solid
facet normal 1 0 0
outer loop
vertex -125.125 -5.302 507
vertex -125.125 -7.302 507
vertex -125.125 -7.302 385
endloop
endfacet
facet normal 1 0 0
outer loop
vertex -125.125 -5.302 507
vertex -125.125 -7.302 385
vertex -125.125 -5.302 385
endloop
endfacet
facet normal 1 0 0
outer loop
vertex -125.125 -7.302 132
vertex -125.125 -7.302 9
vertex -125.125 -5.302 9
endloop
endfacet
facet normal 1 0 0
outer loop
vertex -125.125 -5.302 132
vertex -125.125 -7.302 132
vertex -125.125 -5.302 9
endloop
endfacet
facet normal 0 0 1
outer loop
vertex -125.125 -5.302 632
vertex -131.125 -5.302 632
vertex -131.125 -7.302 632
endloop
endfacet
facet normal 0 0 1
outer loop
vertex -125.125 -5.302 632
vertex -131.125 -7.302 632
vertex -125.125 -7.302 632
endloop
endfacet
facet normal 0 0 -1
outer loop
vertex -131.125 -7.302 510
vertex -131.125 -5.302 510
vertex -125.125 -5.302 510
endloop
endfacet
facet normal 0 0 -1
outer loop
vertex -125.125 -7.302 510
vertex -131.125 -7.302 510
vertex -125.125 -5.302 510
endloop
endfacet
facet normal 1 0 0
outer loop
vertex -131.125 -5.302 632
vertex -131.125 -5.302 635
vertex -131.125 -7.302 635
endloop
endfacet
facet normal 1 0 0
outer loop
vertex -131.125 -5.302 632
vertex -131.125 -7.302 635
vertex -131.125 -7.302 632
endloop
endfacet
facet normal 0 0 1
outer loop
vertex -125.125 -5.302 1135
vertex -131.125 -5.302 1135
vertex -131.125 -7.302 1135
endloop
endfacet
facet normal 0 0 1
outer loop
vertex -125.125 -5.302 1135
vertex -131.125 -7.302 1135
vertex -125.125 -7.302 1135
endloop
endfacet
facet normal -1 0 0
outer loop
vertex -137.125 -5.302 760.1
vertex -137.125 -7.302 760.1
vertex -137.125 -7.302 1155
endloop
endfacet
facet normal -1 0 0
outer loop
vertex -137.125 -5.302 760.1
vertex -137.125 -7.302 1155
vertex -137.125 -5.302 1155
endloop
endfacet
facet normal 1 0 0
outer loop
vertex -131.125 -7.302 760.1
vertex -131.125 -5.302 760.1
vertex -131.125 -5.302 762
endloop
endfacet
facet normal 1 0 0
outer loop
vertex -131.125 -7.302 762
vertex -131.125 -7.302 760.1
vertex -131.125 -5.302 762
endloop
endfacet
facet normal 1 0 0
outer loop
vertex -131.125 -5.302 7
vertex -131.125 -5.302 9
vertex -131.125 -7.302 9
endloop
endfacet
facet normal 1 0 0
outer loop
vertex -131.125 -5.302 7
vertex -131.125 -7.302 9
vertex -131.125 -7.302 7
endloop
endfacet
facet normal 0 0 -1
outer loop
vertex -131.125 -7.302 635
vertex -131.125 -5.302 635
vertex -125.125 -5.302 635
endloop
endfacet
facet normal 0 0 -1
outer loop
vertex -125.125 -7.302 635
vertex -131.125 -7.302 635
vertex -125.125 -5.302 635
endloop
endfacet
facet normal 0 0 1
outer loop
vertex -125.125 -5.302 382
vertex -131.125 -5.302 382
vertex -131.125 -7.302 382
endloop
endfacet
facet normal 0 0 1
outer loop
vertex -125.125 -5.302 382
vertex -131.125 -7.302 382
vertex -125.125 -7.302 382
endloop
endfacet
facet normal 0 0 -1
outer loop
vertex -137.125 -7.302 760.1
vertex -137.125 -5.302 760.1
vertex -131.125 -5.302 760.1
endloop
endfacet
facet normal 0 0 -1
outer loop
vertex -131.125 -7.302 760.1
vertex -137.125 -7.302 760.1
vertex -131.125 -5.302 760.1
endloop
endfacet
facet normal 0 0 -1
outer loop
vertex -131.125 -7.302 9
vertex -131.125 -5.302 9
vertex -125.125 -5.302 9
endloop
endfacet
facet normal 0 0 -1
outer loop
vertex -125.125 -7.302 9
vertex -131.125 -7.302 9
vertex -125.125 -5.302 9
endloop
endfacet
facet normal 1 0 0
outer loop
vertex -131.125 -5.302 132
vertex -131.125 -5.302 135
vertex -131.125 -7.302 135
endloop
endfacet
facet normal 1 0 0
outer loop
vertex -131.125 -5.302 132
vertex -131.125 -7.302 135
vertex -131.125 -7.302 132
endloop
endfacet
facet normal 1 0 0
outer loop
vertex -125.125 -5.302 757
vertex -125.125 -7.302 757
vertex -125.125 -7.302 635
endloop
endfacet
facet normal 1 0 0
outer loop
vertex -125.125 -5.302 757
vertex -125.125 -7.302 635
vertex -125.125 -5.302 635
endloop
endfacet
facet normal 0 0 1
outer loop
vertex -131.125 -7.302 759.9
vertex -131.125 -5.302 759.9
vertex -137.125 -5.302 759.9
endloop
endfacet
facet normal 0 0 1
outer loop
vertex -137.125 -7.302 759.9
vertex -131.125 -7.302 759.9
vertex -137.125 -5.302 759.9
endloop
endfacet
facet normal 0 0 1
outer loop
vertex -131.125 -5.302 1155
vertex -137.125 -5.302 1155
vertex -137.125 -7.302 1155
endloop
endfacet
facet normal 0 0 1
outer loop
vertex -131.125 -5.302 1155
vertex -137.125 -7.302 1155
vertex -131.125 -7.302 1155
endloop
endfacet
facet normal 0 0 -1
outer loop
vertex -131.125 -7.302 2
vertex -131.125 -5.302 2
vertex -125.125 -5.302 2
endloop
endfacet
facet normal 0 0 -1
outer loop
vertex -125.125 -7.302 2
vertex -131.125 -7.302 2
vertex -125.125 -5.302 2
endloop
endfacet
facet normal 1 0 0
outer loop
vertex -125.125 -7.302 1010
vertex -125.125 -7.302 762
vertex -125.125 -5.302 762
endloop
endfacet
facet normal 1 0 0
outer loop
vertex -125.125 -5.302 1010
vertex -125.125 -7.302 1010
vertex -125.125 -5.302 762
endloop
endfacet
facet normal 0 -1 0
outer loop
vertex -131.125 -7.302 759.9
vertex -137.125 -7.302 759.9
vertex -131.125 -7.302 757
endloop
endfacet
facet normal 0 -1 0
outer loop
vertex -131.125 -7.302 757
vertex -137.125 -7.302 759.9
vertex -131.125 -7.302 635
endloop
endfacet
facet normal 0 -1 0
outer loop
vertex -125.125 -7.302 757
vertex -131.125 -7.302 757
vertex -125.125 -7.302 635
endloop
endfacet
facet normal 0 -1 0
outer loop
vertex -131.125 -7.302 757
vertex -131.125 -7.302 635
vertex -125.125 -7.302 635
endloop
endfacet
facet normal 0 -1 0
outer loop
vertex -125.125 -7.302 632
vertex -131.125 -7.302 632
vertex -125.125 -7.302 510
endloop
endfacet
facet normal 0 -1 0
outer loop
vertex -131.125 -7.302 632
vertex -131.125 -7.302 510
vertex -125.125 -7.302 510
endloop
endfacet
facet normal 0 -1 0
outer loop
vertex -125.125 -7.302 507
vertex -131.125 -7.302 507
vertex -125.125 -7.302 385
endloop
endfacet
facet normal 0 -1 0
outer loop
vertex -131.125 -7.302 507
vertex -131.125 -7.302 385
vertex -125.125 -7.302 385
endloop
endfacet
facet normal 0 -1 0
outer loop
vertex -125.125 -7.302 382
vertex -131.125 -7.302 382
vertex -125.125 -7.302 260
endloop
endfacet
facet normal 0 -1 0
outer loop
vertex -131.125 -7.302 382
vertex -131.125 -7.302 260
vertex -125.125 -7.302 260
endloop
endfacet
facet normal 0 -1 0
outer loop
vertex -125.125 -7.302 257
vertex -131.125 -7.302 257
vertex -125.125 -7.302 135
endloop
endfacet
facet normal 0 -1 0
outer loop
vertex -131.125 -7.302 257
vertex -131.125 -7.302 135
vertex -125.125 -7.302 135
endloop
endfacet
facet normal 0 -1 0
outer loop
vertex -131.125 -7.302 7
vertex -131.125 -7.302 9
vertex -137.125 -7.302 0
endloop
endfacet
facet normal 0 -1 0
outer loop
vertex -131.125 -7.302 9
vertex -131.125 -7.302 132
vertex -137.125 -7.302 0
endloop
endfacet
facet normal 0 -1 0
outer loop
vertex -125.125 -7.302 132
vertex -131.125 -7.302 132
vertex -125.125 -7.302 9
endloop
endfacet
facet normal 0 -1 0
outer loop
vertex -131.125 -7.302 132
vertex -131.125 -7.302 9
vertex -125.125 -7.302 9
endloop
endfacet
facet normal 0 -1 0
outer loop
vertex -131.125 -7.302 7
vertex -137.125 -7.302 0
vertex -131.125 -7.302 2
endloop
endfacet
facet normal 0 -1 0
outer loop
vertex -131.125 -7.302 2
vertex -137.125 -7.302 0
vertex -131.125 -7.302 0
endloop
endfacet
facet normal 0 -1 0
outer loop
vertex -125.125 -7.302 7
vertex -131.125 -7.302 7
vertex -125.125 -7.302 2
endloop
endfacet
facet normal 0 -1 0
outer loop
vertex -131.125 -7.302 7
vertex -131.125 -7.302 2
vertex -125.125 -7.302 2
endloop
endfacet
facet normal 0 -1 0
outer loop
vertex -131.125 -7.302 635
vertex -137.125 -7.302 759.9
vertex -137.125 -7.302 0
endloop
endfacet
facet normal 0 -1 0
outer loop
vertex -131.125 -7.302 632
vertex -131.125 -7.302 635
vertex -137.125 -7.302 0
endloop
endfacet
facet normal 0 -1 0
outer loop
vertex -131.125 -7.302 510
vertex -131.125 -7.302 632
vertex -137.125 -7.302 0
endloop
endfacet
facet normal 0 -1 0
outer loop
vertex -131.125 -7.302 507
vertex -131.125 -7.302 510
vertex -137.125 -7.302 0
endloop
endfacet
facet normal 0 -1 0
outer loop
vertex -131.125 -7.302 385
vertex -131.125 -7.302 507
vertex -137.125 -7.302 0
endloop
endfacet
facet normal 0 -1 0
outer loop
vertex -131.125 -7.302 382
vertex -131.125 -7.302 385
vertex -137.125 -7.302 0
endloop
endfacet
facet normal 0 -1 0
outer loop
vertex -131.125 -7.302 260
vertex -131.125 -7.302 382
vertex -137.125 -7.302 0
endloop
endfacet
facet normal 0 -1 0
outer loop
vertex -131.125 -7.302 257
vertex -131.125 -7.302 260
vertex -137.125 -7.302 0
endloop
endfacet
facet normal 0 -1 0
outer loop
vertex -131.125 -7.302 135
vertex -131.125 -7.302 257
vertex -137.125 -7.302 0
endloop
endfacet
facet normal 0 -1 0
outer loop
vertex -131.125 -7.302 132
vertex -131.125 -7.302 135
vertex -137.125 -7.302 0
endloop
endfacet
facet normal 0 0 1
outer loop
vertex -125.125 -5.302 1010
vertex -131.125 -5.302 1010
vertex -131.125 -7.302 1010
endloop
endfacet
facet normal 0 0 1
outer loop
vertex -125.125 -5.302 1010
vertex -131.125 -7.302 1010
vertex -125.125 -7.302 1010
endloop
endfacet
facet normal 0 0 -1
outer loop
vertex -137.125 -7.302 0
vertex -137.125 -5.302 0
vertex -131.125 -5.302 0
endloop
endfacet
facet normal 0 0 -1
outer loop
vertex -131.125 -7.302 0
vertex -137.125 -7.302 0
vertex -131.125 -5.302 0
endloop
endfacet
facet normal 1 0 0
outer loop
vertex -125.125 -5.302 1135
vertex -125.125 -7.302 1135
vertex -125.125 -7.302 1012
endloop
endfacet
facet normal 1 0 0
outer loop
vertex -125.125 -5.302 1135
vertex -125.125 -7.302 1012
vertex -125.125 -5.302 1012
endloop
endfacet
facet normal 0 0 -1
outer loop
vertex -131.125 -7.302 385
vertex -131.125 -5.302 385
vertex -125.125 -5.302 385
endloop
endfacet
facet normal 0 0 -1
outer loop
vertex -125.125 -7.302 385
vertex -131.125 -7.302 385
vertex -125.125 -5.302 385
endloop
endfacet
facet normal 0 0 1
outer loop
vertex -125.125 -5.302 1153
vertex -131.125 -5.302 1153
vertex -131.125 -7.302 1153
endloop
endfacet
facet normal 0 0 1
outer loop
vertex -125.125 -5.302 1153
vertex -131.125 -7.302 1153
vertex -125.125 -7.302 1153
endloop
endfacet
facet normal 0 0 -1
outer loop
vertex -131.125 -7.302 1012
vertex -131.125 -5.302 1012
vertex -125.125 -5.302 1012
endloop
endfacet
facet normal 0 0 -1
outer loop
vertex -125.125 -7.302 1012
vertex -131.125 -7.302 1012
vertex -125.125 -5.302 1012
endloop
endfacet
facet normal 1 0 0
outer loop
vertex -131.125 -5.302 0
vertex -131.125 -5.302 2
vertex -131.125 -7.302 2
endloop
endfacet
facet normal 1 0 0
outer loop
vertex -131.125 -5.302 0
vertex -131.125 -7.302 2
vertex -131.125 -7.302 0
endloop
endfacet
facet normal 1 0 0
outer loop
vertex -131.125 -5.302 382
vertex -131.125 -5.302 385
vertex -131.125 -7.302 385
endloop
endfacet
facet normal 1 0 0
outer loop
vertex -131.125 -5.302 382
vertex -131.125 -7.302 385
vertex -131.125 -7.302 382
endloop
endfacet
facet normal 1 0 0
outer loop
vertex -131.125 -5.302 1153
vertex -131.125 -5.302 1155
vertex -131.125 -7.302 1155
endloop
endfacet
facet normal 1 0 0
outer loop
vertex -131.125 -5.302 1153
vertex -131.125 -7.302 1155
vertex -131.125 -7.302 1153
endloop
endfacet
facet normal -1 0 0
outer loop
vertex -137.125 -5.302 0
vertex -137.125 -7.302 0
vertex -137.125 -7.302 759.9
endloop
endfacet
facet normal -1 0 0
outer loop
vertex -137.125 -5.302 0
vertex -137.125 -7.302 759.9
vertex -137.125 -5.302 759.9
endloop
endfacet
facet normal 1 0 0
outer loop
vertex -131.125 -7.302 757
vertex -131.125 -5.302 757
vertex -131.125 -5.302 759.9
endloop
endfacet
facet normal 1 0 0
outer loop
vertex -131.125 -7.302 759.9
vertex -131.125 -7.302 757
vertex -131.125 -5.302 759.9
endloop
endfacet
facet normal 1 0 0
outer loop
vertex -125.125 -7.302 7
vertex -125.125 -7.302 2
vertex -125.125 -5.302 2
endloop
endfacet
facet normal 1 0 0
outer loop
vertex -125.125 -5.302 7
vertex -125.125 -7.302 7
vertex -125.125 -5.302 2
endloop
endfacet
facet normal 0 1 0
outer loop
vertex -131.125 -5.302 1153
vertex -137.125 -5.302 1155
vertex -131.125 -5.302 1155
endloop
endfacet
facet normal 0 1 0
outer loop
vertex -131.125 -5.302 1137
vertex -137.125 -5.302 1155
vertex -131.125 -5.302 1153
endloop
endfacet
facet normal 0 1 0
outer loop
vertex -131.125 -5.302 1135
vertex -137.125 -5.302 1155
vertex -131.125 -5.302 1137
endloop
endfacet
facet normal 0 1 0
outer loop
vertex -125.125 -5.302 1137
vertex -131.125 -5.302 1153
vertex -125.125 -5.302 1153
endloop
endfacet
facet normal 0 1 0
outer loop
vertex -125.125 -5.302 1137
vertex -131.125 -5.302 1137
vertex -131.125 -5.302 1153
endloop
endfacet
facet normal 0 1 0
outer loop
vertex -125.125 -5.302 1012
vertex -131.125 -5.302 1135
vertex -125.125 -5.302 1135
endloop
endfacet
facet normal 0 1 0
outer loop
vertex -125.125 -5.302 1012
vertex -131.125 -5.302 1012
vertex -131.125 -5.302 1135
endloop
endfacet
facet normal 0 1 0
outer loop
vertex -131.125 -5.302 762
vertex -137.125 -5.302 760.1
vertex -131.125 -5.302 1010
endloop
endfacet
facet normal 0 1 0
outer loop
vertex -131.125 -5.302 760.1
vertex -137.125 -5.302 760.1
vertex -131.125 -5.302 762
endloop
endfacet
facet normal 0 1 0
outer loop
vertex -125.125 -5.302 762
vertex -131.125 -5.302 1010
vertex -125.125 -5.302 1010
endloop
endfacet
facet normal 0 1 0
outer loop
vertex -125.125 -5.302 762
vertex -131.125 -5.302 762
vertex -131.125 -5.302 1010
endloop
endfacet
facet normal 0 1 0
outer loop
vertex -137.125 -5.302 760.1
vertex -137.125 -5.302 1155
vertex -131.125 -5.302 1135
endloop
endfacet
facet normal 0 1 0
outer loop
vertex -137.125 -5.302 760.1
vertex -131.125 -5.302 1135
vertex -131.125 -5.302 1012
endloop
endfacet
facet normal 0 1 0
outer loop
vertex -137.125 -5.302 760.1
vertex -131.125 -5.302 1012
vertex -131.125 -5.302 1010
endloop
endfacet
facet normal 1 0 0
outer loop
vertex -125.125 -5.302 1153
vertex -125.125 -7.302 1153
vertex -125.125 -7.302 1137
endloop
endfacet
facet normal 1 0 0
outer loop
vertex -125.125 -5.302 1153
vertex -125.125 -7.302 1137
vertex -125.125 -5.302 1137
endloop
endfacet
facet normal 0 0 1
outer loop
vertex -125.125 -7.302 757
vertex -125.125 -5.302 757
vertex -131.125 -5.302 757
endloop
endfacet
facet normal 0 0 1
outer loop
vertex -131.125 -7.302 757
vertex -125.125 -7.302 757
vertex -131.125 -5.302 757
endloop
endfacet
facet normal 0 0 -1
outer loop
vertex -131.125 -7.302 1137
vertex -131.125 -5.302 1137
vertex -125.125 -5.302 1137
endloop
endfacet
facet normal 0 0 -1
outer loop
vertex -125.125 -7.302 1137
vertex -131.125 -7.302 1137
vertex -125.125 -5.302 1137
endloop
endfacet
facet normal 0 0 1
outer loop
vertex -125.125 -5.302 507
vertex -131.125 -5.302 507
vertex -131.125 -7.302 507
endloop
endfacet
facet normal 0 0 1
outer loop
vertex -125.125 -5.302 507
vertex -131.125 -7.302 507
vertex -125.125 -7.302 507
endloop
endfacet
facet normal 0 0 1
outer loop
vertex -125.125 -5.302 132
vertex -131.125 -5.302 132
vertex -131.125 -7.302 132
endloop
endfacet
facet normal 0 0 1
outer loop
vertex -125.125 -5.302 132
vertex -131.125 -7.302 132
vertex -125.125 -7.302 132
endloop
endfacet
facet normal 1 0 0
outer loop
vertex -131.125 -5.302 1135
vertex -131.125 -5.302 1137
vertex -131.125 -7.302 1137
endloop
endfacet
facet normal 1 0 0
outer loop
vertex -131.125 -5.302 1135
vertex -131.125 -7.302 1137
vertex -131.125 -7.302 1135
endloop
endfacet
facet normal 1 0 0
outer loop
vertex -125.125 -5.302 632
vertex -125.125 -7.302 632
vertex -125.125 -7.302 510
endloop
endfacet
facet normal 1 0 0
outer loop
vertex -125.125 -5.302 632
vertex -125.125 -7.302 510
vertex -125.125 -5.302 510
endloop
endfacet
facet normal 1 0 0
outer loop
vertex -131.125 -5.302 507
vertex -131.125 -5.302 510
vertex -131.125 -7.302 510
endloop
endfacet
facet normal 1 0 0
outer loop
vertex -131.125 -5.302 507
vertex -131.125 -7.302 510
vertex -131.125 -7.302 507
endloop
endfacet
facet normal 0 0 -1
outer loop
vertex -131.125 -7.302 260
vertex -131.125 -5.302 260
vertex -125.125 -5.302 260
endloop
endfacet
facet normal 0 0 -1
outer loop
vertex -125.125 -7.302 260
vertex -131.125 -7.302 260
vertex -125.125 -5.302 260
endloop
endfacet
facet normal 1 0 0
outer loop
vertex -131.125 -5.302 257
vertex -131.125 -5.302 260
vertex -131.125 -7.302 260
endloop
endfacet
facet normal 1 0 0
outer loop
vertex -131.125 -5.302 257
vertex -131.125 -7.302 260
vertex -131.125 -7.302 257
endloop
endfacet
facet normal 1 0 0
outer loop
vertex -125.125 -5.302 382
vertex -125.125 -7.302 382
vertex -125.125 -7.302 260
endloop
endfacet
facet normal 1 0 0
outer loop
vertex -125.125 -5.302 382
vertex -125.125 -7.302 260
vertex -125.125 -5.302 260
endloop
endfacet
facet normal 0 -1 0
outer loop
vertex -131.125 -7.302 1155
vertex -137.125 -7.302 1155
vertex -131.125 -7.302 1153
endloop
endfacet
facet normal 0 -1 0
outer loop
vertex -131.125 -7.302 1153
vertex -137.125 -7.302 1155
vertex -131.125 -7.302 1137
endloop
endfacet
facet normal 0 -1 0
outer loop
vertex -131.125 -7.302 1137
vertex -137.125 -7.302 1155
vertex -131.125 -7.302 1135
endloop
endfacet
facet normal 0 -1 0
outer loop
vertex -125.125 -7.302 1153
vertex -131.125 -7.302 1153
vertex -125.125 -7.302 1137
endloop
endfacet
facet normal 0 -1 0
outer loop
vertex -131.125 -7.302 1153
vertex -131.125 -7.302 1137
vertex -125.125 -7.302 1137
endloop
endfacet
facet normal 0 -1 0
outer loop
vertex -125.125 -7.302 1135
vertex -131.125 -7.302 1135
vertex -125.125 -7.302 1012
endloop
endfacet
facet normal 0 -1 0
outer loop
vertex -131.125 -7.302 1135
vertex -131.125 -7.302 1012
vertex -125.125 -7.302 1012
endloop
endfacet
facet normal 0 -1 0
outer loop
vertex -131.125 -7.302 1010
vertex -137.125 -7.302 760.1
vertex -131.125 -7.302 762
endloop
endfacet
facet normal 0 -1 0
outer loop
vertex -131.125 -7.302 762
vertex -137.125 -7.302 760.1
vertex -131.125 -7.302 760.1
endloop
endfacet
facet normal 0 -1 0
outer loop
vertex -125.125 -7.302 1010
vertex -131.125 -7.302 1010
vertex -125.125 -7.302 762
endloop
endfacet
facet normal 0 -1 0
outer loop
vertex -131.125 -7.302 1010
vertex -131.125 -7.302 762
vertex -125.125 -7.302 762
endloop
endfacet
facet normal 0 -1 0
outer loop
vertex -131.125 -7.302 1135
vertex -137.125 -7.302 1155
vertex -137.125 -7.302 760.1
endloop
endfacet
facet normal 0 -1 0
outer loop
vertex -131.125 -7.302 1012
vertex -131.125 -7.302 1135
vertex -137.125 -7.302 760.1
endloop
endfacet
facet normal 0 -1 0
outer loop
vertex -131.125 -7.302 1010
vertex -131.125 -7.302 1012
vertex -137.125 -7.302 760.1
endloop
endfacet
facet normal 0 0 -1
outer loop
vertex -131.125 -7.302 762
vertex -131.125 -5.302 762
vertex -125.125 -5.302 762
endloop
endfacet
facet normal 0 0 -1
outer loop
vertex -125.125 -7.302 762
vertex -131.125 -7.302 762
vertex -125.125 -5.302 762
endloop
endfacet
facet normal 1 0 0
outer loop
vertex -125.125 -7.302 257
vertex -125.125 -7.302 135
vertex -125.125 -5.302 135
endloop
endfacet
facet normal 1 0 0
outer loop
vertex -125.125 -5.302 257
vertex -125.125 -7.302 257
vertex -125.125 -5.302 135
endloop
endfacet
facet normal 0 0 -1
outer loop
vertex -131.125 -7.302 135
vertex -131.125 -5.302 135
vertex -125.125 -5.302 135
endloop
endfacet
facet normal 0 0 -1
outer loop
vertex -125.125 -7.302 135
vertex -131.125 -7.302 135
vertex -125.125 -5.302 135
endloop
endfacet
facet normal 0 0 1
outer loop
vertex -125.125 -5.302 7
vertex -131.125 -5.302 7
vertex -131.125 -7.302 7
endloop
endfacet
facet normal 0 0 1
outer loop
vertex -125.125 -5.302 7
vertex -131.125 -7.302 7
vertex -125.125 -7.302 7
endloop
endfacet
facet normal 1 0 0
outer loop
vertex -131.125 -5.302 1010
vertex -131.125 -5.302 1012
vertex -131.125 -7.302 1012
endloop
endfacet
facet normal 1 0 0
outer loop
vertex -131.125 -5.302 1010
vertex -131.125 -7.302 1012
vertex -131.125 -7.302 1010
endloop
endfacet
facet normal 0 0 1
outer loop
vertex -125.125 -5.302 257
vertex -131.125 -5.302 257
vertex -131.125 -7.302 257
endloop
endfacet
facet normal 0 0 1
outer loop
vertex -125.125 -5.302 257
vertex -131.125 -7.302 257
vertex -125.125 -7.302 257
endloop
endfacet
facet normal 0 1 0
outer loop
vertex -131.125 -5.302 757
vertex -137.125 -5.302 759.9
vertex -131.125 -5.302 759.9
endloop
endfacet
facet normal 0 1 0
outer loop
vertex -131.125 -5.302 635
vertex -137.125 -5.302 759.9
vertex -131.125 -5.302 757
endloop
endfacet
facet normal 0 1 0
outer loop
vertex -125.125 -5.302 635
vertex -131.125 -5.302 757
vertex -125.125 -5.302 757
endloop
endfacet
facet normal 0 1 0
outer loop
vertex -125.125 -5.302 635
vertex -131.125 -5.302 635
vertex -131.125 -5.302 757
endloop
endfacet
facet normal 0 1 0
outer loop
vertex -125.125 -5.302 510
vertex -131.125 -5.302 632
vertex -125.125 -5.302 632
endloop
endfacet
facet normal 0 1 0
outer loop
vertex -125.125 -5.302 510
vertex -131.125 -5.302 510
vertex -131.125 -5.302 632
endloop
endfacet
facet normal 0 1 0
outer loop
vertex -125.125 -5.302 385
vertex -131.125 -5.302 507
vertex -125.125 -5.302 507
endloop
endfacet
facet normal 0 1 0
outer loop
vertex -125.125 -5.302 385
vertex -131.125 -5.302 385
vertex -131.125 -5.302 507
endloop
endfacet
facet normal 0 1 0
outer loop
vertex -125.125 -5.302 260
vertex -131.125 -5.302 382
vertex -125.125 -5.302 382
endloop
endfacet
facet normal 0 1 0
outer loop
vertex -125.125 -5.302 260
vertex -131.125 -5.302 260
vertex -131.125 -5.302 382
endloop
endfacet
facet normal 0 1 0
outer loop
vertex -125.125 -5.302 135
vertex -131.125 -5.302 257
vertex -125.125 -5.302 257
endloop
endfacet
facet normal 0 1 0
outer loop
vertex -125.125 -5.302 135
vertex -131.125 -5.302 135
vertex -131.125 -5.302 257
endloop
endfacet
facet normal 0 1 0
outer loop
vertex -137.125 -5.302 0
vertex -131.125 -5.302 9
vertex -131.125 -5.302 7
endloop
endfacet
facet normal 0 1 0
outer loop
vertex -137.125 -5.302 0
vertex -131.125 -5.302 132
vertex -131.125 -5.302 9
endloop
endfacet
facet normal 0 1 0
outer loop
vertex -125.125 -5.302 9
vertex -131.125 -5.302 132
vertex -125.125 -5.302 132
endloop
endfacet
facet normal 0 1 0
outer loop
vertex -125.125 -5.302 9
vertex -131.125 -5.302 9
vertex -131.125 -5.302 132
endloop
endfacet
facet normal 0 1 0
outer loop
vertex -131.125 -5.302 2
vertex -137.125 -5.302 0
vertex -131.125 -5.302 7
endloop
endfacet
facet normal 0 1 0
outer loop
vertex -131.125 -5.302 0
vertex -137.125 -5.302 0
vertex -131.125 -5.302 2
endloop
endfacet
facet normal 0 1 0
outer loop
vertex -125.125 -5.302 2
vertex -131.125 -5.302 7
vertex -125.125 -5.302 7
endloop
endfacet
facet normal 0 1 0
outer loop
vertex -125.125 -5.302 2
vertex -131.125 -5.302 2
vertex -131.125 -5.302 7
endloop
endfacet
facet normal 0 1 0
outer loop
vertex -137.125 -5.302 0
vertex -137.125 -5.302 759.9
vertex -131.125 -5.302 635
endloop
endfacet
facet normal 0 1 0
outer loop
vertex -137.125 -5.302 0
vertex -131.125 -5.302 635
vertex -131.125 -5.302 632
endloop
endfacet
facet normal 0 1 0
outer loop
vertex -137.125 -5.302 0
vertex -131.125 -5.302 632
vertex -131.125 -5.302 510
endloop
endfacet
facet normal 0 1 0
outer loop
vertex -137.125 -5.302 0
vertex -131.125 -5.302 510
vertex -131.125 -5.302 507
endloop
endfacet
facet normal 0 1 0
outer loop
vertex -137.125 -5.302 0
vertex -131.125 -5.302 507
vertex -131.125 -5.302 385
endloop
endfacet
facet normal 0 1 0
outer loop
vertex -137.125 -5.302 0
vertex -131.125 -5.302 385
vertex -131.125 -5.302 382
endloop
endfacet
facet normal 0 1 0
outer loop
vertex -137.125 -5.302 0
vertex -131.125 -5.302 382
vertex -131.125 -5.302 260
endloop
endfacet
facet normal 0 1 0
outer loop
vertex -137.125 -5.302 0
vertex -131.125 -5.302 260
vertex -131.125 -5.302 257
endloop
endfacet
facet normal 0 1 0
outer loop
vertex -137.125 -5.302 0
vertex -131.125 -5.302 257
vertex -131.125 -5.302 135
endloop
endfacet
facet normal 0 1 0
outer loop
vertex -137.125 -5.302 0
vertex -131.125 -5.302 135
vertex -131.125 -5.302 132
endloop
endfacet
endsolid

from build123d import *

# Parameters (mm, degrees)
SKETCH_1_W          = 12
SKETCH_1_H          = 2
EXTRUDE_1_DEPTH     = 1155
SKETCH_3_W          = 6
SKETCH_3_H          = 2
SKETCH_3_H_2        = 3
CUT_EXTRUDE_1_DEPTH = 1164.113232196


with BuildPart() as part:
    # 草图1 → 凸台-拉伸1 (new body)
    with BuildSketch(Plane.XY):
        with Locations((-131.125456821, -6.301880905)):
            Rectangle(SKETCH_1_W, SKETCH_1_H)
    extrude(amount=EXTRUDE_1_DEPTH)

    # 草图3 → 切除-拉伸1 (cut, through all)
    with BuildSketch(Plane(origin=(0, -5.301880905, 0), x_dir=(1, 0, 0), z_dir=(0, 1, 0))):
        with Locations((-128.125456821, -1)):
            Rectangle(SKETCH_3_W, SKETCH_3_H)
        with Locations((-128.125456821, -8)):
            Rectangle(SKETCH_3_W, SKETCH_3_H)
        with Locations((-128.125456821, -258.5)):
            Rectangle(SKETCH_3_W, SKETCH_3_H_2)
        with Locations((-128.125456821, -133.5)):
            Rectangle(SKETCH_3_W, SKETCH_3_H_2)
        with Locations((-128.125456821, -383.5)):
            Rectangle(SKETCH_3_W, SKETCH_3_H_2)
        with Locations((-128.125456821, -508.5)):
            Rectangle(SKETCH_3_W, SKETCH_3_H_2)
        with Locations((-128.125456821, -633.5)):
            Rectangle(SKETCH_3_W, SKETCH_3_H_2)
        Polygon((-125.125456821, -760), (-125.125456821, -757), (-131.125456821, -757), (-131.125456821, -759.9), (-137.125456821, -759.9), (-137.125456821, -760.1), (-131.125456821, -760.1), (-131.125456821, -762), (-125.125456821, -762), align=None)
        with Locations((-128.125456821, -1011)):
            Rectangle(SKETCH_3_W, SKETCH_3_H)
        with Locations((-128.125456821, -1136)):
            Rectangle(SKETCH_3_W, SKETCH_3_H)
        with Locations((-128.125456821, -1154)):
            Rectangle(SKETCH_3_W, SKETCH_3_H)
    extrude(amount=-CUT_EXTRUDE_1_DEPTH, mode=Mode.SUBTRACT)


with BuildPart() as cut_extrude_1_piece_1:
    # of the separate pieces the step leaves, piece 1, a body of its own (cut_extrude_1_pieces)
    add(part.part.solids().sort_by_distance((-137.125456821, -5.301880905, 0))[0])


with BuildPart() as cut_extrude_1_piece_2:
    # of the separate pieces the step leaves, piece 2, a body of its own (cut_extrude_1_pieces)
    add(part.part.solids().sort_by_distance((-137.125456821, -5.301880905, 760.1))[0])


solid = Compound([cut_extrude_1_piece_1.part, cut_extrude_1_piece_2.part])
